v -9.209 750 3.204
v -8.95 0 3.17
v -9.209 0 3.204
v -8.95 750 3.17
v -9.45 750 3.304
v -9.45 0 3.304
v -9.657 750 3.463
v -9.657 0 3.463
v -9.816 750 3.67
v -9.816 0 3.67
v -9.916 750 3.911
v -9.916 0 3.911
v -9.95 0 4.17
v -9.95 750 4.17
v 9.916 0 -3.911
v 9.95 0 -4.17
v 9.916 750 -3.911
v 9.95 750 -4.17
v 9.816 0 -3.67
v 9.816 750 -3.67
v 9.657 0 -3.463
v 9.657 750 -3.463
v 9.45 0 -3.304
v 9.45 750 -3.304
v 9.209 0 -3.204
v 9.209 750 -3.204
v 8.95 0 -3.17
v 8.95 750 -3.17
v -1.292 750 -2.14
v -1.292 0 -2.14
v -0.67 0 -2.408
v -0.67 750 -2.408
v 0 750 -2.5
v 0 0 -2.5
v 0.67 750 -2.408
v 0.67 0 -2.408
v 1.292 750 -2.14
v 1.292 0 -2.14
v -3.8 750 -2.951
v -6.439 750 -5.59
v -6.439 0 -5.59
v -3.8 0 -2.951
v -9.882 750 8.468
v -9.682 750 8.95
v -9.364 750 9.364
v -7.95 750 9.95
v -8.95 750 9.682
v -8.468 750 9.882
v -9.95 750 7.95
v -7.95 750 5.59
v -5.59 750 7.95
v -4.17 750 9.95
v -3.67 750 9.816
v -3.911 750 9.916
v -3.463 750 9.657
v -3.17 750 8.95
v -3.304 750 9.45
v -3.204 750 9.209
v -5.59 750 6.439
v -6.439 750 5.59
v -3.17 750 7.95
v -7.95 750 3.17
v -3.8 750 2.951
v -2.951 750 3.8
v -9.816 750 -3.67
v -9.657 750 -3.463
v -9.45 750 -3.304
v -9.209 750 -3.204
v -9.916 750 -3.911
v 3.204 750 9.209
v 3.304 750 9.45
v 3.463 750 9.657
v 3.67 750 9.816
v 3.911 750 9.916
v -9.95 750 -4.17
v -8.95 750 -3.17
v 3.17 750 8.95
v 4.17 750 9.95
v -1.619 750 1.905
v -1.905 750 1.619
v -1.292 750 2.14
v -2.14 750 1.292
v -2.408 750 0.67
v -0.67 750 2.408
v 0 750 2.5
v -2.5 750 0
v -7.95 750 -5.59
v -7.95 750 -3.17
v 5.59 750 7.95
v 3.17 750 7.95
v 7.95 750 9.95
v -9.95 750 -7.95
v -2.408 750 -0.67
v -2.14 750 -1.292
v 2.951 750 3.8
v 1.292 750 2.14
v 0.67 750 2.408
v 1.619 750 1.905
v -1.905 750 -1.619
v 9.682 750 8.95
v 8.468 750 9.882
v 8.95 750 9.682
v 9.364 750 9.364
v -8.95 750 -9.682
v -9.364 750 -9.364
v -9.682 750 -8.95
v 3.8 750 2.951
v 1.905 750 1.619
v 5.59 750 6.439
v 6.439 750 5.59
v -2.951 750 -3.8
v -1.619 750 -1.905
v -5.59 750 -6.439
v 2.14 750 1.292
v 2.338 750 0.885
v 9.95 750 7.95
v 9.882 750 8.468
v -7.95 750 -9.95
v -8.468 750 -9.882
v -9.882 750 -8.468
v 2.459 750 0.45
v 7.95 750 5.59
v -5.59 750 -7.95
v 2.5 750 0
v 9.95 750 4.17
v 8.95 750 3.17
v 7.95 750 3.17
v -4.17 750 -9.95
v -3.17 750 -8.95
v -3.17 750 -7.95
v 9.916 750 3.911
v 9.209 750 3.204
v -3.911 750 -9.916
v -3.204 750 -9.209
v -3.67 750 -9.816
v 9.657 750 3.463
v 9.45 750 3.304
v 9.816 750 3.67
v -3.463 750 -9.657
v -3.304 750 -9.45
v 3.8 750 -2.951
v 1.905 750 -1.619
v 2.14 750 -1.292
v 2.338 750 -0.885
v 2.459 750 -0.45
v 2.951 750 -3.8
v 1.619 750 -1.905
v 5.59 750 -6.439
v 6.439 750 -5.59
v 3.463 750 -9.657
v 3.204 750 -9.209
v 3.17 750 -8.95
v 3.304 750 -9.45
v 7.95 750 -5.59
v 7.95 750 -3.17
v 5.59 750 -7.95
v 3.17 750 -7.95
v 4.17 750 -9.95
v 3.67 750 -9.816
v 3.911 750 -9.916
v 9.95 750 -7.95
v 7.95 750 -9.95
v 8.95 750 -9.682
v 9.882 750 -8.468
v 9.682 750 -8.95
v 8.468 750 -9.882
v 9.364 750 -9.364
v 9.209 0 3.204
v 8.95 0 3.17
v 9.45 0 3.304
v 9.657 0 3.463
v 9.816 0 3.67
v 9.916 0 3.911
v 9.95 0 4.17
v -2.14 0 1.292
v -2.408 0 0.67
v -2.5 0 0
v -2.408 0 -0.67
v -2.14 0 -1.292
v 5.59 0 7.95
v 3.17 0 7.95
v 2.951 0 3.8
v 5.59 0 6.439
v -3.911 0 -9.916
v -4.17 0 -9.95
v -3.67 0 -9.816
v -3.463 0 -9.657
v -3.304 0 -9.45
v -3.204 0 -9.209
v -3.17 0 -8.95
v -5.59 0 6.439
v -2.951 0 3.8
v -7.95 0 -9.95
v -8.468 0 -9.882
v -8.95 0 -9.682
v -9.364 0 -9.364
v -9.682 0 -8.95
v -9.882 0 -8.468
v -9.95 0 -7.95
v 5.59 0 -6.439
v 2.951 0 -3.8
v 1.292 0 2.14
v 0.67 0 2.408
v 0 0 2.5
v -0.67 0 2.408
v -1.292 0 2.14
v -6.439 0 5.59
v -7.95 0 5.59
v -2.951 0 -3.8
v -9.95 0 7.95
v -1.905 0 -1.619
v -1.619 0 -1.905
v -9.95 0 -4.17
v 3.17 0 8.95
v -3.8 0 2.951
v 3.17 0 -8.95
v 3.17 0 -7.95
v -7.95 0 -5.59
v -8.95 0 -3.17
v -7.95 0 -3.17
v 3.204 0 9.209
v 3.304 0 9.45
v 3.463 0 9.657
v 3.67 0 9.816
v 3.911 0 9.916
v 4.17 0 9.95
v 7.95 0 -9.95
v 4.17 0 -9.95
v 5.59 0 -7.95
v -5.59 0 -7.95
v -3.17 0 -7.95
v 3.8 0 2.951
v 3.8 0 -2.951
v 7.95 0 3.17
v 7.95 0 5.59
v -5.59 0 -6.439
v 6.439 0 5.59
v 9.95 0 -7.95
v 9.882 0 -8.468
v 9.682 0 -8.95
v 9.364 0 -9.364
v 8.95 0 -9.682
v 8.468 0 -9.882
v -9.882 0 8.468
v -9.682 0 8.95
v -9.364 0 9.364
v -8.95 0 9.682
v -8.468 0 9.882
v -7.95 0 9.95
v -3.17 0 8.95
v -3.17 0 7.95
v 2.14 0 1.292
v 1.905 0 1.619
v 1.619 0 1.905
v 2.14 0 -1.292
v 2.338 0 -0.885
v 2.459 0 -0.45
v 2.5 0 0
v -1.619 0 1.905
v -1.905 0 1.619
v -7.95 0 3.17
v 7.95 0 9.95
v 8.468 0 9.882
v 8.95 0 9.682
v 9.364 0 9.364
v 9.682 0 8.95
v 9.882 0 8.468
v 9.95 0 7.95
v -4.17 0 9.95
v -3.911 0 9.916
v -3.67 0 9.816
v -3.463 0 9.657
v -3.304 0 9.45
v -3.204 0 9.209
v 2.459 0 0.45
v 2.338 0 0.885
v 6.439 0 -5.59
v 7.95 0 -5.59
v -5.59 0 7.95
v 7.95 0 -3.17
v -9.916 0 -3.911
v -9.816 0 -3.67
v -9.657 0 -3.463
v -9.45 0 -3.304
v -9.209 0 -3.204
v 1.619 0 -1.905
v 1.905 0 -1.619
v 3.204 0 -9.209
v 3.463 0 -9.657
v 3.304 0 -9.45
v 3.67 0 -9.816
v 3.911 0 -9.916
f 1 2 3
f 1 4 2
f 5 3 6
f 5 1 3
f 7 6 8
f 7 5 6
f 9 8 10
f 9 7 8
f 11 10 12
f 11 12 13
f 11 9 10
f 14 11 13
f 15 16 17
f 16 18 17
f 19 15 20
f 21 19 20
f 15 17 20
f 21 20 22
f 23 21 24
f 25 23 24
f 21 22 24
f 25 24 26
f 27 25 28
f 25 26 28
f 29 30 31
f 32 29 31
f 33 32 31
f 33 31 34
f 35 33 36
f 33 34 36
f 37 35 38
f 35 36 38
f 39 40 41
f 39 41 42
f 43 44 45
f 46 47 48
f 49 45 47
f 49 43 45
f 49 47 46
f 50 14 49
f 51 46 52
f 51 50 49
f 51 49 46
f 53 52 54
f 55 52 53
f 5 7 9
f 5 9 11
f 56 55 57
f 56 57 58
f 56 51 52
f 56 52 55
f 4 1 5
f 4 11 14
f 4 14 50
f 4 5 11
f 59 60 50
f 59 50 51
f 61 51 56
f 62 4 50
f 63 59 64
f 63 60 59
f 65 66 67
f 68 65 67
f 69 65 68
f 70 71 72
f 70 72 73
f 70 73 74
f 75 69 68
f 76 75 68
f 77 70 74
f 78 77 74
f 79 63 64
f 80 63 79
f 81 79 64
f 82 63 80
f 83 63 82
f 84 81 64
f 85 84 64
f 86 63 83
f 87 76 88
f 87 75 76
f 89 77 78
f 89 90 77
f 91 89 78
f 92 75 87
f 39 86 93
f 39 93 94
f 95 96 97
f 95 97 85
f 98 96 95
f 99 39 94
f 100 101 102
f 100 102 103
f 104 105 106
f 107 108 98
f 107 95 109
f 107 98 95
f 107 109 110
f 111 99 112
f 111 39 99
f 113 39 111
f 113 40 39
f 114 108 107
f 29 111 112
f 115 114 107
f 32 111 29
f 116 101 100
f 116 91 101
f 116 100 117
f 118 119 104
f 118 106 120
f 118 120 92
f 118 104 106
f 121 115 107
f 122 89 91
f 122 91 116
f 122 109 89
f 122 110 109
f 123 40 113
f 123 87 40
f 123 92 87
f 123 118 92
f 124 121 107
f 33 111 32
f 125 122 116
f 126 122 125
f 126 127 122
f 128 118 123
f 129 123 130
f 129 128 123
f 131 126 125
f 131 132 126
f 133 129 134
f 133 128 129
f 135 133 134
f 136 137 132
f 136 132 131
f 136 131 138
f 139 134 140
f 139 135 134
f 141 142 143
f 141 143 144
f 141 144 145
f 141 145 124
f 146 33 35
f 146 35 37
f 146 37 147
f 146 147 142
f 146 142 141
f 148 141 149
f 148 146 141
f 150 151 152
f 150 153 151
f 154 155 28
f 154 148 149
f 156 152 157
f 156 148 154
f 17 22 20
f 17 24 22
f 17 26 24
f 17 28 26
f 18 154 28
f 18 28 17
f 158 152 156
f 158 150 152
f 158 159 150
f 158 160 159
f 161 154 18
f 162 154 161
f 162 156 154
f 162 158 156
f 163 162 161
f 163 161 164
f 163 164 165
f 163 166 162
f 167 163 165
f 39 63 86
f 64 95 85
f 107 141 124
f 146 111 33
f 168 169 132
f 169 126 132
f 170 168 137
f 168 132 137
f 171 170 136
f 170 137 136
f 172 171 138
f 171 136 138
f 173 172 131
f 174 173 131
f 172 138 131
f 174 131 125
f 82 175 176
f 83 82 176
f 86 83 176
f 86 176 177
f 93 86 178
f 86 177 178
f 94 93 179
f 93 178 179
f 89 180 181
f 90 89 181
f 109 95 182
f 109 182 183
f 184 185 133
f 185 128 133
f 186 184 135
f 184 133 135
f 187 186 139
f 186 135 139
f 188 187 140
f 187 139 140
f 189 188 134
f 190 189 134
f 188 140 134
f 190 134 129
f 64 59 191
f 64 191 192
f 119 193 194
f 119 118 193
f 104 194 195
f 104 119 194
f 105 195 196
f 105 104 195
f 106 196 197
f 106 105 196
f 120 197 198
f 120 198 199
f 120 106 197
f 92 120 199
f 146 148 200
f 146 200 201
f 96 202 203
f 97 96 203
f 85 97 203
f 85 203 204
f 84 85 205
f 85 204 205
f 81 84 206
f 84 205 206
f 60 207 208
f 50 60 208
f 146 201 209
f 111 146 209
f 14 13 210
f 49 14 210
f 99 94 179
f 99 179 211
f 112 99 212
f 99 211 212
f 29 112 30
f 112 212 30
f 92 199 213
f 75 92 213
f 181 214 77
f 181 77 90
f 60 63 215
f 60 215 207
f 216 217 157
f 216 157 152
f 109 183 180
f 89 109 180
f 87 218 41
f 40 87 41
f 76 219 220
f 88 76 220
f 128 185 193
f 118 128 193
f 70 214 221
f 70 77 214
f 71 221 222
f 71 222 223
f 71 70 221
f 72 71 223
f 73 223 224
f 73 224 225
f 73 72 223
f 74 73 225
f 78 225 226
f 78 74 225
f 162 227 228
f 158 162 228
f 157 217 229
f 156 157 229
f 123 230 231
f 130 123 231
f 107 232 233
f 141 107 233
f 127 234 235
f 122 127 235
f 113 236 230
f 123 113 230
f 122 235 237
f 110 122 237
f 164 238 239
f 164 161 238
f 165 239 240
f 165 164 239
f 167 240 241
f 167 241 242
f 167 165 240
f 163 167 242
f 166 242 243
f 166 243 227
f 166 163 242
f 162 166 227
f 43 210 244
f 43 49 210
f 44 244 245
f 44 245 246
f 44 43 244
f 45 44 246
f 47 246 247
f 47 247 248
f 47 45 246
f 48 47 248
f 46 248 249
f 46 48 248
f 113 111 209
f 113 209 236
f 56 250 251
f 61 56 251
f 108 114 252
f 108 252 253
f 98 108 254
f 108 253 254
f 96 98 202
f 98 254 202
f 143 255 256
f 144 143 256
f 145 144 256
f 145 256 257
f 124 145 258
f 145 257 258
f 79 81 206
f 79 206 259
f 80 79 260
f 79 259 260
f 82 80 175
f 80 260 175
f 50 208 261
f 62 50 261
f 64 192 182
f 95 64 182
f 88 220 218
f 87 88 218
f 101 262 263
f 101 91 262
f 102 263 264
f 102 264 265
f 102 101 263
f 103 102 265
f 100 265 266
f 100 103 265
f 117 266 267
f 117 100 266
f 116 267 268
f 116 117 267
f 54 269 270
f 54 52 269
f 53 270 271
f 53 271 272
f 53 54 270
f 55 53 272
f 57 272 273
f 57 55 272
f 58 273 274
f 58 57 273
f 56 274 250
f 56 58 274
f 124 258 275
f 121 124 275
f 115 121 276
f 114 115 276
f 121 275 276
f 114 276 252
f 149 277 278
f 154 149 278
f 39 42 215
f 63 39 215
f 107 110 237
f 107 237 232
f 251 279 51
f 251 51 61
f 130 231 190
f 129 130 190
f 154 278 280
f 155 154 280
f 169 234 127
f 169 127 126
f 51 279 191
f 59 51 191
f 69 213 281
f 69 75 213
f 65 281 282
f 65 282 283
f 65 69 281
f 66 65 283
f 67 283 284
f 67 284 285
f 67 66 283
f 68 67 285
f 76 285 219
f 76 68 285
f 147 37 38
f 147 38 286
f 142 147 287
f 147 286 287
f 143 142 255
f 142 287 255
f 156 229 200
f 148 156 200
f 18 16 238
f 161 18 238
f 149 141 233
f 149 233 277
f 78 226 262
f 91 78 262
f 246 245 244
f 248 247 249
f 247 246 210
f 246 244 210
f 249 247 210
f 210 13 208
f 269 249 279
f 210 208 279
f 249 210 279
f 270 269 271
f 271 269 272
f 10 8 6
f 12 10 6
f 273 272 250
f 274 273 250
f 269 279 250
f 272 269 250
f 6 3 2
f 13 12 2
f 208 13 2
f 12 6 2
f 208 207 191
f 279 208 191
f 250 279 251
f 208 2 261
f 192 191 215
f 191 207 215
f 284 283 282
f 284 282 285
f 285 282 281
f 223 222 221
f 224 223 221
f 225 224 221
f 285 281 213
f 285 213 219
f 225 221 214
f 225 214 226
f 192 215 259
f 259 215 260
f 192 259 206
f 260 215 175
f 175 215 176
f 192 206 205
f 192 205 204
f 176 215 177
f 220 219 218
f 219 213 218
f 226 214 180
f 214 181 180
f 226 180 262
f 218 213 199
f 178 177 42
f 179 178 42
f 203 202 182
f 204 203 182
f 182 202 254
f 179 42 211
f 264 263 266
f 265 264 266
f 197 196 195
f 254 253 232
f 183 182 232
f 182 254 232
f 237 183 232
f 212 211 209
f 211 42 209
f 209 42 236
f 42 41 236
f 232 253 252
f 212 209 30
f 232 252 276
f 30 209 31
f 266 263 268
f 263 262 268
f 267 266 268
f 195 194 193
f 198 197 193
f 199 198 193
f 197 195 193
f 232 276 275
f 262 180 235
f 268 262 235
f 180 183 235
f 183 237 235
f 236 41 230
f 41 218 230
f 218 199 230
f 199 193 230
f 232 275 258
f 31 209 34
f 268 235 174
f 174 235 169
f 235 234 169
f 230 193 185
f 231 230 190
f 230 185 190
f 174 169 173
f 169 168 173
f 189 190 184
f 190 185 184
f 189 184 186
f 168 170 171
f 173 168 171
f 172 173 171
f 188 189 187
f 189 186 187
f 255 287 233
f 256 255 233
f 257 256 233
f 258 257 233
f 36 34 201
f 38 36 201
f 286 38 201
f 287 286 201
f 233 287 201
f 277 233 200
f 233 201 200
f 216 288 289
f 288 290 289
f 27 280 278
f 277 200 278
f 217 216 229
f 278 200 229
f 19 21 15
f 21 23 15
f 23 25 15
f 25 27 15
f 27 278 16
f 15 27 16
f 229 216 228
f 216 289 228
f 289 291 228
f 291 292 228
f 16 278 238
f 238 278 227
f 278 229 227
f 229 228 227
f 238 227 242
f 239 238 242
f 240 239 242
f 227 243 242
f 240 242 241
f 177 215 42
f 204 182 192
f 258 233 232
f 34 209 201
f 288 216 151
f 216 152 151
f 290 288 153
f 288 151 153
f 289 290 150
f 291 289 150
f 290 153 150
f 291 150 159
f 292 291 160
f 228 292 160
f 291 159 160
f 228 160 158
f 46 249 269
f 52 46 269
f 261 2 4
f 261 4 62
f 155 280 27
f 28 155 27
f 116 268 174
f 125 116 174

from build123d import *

# Parameters (mm, degrees)
SKETCH_1_W      = 2.42
SKETCH_1_H      = 2
SKETCH_1_W_2    = 2
SKETCH_1_H_2    = 2.42
EXTRUDE_1_DEPTH = 750
FILLET_1_R      = 2
FILLET_2_R      = 1


with BuildPart() as part:
    # 草图1 → 凸台-拉伸1 (new body)
    with BuildSketch(Plane(origin=(0, 0, 0), x_dir=(1, 0, 0), z_dir=(0, 1, 0))):
        with Locations((-4.38, 8.95)):
            Rectangle(SKETCH_1_W, SKETCH_1_H)
        Polygon((-7.101471863, 7.95), (-5.59, 7.95), (-5.59, 9.95), (-7.95, 9.95), (-7.95, 8.798528137), align=None)
        Polygon((-9.101471863, 9.95), (-7.95, 8.798528137), (-7.95, 9.95), align=None)
        Polygon((-9.95, 9.101471863), (-8.798528137, 7.95), (-7.95, 7.95), (-7.95, 8.798528137), (-9.101471863, 9.95), (-9.95, 9.95), align=None)
        Polygon((-9.95, 7.95), (-8.798528137, 7.95), (-9.95, 9.101471863), align=None)
        Polygon((-9.95, 5.59), (-7.95, 5.59), (-7.95, 7.101471863), (-8.798528137, 7.95), (-9.95, 7.95), align=None)
        Polygon((-7.95, 7.95), (-7.101471863, 7.95), (-7.95, 8.798528137), align=None)
        Polygon((-8.798528137, 7.95), (-7.95, 7.101471863), (-7.95, 7.95), align=None)
        with Locations((-8.95, 4.38)):
            Rectangle(SKETCH_1_W_2, SKETCH_1_H_2)
        Polygon((-7.101471863, 7.95), (-5.59, 6.438528137), (-5.59, 7.95), align=None)
        Polygon((-7.95, 7.101471863), (-6.438528137, 5.59), (-5.59, 5.59), (-5.59, 6.438528137), (-7.101471863, 7.95), (-7.95, 7.95), align=None)
        Polygon((-7.95, 5.59), (-6.438528137, 5.59), (-7.95, 7.101471863), align=None)
        Polygon((-6.438528137, 5.59), (-3.8, 2.951471863), (-3.8, 3.8), (-2.951471863, 3.8), (-5.59, 6.438528137), (-5.59, 5.59), align=None)
        with Locations((4.38, 8.95)):
            Rectangle(SKETCH_1_W, SKETCH_1_H)
        Polygon((7.101471863, 7.95), (7.95, 8.798528137), (7.95, 9.95), (5.59, 9.95), (5.59, 7.95), align=None)
        Polygon((7.95, 8.798528137), (9.101471863, 9.95), (7.95, 9.95), align=None)
        Polygon((8.798528137, 7.95), (9.95, 9.101471863), (9.95, 9.95), (9.101471863, 9.95), (7.95, 8.798528137), (7.95, 7.95), align=None)
        Polygon((8.798528137, 7.95), (9.95, 7.95), (9.95, 9.101471863), align=None)
        Polygon((7.95, 5.59), (9.95, 5.59), (9.95, 7.95), (8.798528137, 7.95), (7.95, 7.101471863), align=None)
        Polygon((7.101471863, 7.95), (7.95, 7.95), (7.95, 8.798528137), align=None)
        Polygon((7.95, 7.101471863), (8.798528137, 7.95), (7.95, 7.95), align=None)
        with Locations((8.95, 4.38)):
            Rectangle(SKETCH_1_W_2, SKETCH_1_H_2)
        Polygon((5.59, 5.59), (6.438528137, 5.59), (7.95, 7.101471863), (7.95, 7.95), (7.101471863, 7.95), (5.59, 6.438528137), align=None)
        Polygon((6.438528137, 5.59), (7.95, 5.59), (7.95, 7.101471863), align=None)
        Polygon((5.59, 7.95), (5.59, 6.438528137), (7.101471863, 7.95), align=None)
        Polygon((3.8, 3.8), (3.8, 2.951471863), (6.438528137, 5.59), (5.59, 5.59), (5.59, 6.438528137), (2.951471863, 3.8), align=None)
        with Locations((8.95, -4.38)):
            Rectangle(SKETCH_1_W_2, SKETCH_1_H_2)
        Polygon((8.798528137, -7.95), (9.95, -7.95), (9.95, -5.59), (7.95, -5.59), (7.95, -7.101471863), align=None)
        Polygon((8.798528137, -7.95), (9.95, -9.101471863), (9.95, -7.95), align=None)
        Polygon((9.101471863, -9.95), (9.95, -9.95), (9.95, -9.101471863), (8.798528137, -7.95), (7.95, -7.95), (7.95, -8.798528137), align=None)
        Polygon((7.95, -9.95), (9.101471863, -9.95), (7.95, -8.798528137), align=None)
        Polygon((7.95, -7.95), (8.798528137, -7.95), (7.95, -7.101471863), align=None)
        Polygon((7.101471863, -7.95), (7.95, -8.798528137), (7.95, -7.95), align=None)
        Polygon((5.59, -9.95), (7.95, -9.95), (7.95, -8.798528137), (7.101471863, -7.95), (5.59, -7.95), align=None)
        with Locations((4.38, -8.95)):
            Rectangle(SKETCH_1_W, SKETCH_1_H)
        Polygon((5.59, -7.95), (7.101471863, -7.95), (5.59, -6.438528137), align=None)
        Polygon((5.59, -6.438528137), (7.101471863, -7.95), (7.95, -7.95), (7.95, -7.101471863), (6.438528137, -5.59), (5.59, -5.59), align=None)
        Polygon((6.438528137, -5.59), (7.95, -7.101471863), (7.95, -5.59), align=None)
        with Locations((-8.95, -4.38)):
            Rectangle(SKETCH_1_W_2, SKETCH_1_H_2)
        Polygon((-8.798528137, -7.95), (-7.95, -7.101471863), (-7.95, -5.59), (-9.95, -5.59), (-9.95, -7.95), align=None)
        Polygon((-7.95, -7.101471863), (-6.438528137, -5.59), (-7.95, -5.59), align=None)
        Polygon((-7.101471863, -7.95), (-5.59, -6.438528137), (-5.59, -5.59), (-6.438528137, -5.59), (-7.95, -7.101471863), (-7.95, -7.95), align=None)
        Polygon((-7.101471863, -7.95), (-5.59, -7.95), (-5.59, -6.438528137), align=None)
        Polygon((-7.95, -9.95), (-5.59, -9.95), (-5.59, -7.95), (-7.101471863, -7.95), (-7.95, -8.798528137), align=None)
        with Locations((-4.38, -8.95)):
            Rectangle(SKETCH_1_W, SKETCH_1_H)
        Polygon((-7.95, -7.95), (-7.95, -8.798528137), (-7.101471863, -7.95), align=None)
        Polygon((-8.798528137, -7.95), (-7.95, -7.95), (-7.95, -7.101471863), align=None)
        Polygon((-9.95, -9.95), (-9.101471863, -9.95), (-7.95, -8.798528137), (-7.95, -7.95), (-8.798528137, -7.95), (-9.95, -9.101471863), align=None)
        Polygon((-9.95, -7.95), (-9.95, -9.101471863), (-8.798528137, -7.95), align=None)
        Polygon((-9.101471863, -9.95), (-7.95, -9.95), (-7.95, -8.798528137), align=None)
        Polygon((-5.59, -6.438528137), (-2.951471863, -3.8), (-3.8, -3.8), (-3.8, -2.951471863), (-6.438528137, -5.59), (-5.59, -5.59), align=None)
        Polygon((2.951471863, -3.8), (5.59, -6.438528137), (5.59, -5.59), (6.438528137, -5.59), (3.8, -2.951471863), (3.8, -3.8), align=None)
        with BuildLine():
            Line((2.140364299, -1.291836161), (3.8, -2.951471863))
            Line((3.8, -2.951471863), (3.8, 2.951471863))
            Line((3.8, 2.951471863), (2.140364299, 1.291836161))
            ThreePointArc((2.140364299, 1.291836161), (2.408413456, 0.670480892), (2.5, 0))
            ThreePointArc((2.5, 0), (2.408413456, -0.670480892), (2.140364299, -1.291836161))
        make_face()
        with BuildLine():
            Line((1.291836161, 2.140364299), (2.951471863, 3.8))
            Line((2.951471863, 3.8), (-2.951471863, 3.8))
            Line((-2.951471863, 3.8), (-1.291836161, 2.140364299))
            ThreePointArc((-1.291836161, 2.140364299), (0, 2.5), (1.291836161, 2.140364299))
        make_face()
        with BuildLine():
            Line((-3.8, 2.951471863), (-3.8, -2.951471863))
            Line((-3.8, -2.951471863), (-2.140364299, -1.291836161))
            ThreePointArc((-2.140364299, -1.291836161), (-2.5, 0), (-2.140364299, 1.291836161))
            Line((-2.140364299, 1.291836161), (-3.8, 2.951471863))
        make_face()
        with BuildLine():
            Line((-2.951471863, -3.8), (2.951471863, -3.8))
            Line((2.951471863, -3.8), (1.291836161, -2.140364299))
            ThreePointArc((1.291836161, -2.140364299), (0, -2.5), (-1.291836161, -2.140364299))
            Line((-1.291836161, -2.140364299), (-2.951471863, -3.8))
        make_face()
        with BuildLine():
            Line((-3.8, -3.8), (-2.951471863, -3.8))
            Line((-2.951471863, -3.8), (-1.291836161, -2.140364299))
            ThreePointArc((-1.291836161, -2.140364299), (-1.767766953, -1.767766953), (-2.140364299, -1.291836161))
            Line((-2.140364299, -1.291836161), (-3.8, -2.951471863))
            Line((-3.8, -2.951471863), (-3.8, -3.8))
        make_face()
        with BuildLine():
            Line((1.291836161, -2.140364299), (2.951471863, -3.8))
            Line((2.951471863, -3.8), (3.8, -3.8))
            Line((3.8, -3.8), (3.8, -2.951471863))
            Line((3.8, -2.951471863), (2.140364299, -1.291836161))
            ThreePointArc((2.140364299, -1.291836161), (1.767766953, -1.767766953), (1.291836161, -2.140364299))
        make_face()
        with BuildLine():
            Line((2.140364299, 1.291836161), (3.8, 2.951471863))
            Line((3.8, 2.951471863), (3.8, 3.8))
            Line((3.8, 3.8), (2.951471863, 3.8))
            Line((2.951471863, 3.8), (1.291836161, 2.140364299))
            ThreePointArc((1.291836161, 2.140364299), (1.767766953, 1.767766953), (2.140364299, 1.291836161))
        make_face()
        with BuildLine():
            Line((-3.8, 3.8), (-3.8, 2.951471863))
            Line((-3.8, 2.951471863), (-2.140364299, 1.291836161))
            ThreePointArc((-2.140364299, 1.291836161), (-1.767766953, 1.767766953), (-1.291836161, 2.140364299))
            Line((-1.291836161, 2.140364299), (-2.951471863, 3.8))
            Line((-2.951471863, 3.8), (-3.8, 3.8))
        make_face()
    extrude(amount=EXTRUDE_1_DEPTH)

    # 圆角1
    fillet_1_edges = [part.edges().sort_by_distance(p)[0] for p in [
        (-9.95, 375, 9.95),
        (-9.95, 375, -9.95),
        (9.95, 375, -9.95),
        (9.95, 375, 9.95),
    ]]
    fillet(fillet_1_edges, radius=FILLET_1_R)

    # 圆角2
    fillet_2_edges = [part.edges().sort_by_distance(p)[0] for p in [
        (3.17, 375, 9.95),
        (-3.17, 375, 9.95),
        (-9.95, 375, 3.17),
        (-9.95, 375, -3.17),
        (-3.17, 375, -9.95),
        (3.17, 375, -9.95),
        (9.95, 375, -3.17),
        (9.95, 375, 3.17),
    ]]
    fillet(fillet_2_edges, radius=FILLET_2_R)


solid = part.part
